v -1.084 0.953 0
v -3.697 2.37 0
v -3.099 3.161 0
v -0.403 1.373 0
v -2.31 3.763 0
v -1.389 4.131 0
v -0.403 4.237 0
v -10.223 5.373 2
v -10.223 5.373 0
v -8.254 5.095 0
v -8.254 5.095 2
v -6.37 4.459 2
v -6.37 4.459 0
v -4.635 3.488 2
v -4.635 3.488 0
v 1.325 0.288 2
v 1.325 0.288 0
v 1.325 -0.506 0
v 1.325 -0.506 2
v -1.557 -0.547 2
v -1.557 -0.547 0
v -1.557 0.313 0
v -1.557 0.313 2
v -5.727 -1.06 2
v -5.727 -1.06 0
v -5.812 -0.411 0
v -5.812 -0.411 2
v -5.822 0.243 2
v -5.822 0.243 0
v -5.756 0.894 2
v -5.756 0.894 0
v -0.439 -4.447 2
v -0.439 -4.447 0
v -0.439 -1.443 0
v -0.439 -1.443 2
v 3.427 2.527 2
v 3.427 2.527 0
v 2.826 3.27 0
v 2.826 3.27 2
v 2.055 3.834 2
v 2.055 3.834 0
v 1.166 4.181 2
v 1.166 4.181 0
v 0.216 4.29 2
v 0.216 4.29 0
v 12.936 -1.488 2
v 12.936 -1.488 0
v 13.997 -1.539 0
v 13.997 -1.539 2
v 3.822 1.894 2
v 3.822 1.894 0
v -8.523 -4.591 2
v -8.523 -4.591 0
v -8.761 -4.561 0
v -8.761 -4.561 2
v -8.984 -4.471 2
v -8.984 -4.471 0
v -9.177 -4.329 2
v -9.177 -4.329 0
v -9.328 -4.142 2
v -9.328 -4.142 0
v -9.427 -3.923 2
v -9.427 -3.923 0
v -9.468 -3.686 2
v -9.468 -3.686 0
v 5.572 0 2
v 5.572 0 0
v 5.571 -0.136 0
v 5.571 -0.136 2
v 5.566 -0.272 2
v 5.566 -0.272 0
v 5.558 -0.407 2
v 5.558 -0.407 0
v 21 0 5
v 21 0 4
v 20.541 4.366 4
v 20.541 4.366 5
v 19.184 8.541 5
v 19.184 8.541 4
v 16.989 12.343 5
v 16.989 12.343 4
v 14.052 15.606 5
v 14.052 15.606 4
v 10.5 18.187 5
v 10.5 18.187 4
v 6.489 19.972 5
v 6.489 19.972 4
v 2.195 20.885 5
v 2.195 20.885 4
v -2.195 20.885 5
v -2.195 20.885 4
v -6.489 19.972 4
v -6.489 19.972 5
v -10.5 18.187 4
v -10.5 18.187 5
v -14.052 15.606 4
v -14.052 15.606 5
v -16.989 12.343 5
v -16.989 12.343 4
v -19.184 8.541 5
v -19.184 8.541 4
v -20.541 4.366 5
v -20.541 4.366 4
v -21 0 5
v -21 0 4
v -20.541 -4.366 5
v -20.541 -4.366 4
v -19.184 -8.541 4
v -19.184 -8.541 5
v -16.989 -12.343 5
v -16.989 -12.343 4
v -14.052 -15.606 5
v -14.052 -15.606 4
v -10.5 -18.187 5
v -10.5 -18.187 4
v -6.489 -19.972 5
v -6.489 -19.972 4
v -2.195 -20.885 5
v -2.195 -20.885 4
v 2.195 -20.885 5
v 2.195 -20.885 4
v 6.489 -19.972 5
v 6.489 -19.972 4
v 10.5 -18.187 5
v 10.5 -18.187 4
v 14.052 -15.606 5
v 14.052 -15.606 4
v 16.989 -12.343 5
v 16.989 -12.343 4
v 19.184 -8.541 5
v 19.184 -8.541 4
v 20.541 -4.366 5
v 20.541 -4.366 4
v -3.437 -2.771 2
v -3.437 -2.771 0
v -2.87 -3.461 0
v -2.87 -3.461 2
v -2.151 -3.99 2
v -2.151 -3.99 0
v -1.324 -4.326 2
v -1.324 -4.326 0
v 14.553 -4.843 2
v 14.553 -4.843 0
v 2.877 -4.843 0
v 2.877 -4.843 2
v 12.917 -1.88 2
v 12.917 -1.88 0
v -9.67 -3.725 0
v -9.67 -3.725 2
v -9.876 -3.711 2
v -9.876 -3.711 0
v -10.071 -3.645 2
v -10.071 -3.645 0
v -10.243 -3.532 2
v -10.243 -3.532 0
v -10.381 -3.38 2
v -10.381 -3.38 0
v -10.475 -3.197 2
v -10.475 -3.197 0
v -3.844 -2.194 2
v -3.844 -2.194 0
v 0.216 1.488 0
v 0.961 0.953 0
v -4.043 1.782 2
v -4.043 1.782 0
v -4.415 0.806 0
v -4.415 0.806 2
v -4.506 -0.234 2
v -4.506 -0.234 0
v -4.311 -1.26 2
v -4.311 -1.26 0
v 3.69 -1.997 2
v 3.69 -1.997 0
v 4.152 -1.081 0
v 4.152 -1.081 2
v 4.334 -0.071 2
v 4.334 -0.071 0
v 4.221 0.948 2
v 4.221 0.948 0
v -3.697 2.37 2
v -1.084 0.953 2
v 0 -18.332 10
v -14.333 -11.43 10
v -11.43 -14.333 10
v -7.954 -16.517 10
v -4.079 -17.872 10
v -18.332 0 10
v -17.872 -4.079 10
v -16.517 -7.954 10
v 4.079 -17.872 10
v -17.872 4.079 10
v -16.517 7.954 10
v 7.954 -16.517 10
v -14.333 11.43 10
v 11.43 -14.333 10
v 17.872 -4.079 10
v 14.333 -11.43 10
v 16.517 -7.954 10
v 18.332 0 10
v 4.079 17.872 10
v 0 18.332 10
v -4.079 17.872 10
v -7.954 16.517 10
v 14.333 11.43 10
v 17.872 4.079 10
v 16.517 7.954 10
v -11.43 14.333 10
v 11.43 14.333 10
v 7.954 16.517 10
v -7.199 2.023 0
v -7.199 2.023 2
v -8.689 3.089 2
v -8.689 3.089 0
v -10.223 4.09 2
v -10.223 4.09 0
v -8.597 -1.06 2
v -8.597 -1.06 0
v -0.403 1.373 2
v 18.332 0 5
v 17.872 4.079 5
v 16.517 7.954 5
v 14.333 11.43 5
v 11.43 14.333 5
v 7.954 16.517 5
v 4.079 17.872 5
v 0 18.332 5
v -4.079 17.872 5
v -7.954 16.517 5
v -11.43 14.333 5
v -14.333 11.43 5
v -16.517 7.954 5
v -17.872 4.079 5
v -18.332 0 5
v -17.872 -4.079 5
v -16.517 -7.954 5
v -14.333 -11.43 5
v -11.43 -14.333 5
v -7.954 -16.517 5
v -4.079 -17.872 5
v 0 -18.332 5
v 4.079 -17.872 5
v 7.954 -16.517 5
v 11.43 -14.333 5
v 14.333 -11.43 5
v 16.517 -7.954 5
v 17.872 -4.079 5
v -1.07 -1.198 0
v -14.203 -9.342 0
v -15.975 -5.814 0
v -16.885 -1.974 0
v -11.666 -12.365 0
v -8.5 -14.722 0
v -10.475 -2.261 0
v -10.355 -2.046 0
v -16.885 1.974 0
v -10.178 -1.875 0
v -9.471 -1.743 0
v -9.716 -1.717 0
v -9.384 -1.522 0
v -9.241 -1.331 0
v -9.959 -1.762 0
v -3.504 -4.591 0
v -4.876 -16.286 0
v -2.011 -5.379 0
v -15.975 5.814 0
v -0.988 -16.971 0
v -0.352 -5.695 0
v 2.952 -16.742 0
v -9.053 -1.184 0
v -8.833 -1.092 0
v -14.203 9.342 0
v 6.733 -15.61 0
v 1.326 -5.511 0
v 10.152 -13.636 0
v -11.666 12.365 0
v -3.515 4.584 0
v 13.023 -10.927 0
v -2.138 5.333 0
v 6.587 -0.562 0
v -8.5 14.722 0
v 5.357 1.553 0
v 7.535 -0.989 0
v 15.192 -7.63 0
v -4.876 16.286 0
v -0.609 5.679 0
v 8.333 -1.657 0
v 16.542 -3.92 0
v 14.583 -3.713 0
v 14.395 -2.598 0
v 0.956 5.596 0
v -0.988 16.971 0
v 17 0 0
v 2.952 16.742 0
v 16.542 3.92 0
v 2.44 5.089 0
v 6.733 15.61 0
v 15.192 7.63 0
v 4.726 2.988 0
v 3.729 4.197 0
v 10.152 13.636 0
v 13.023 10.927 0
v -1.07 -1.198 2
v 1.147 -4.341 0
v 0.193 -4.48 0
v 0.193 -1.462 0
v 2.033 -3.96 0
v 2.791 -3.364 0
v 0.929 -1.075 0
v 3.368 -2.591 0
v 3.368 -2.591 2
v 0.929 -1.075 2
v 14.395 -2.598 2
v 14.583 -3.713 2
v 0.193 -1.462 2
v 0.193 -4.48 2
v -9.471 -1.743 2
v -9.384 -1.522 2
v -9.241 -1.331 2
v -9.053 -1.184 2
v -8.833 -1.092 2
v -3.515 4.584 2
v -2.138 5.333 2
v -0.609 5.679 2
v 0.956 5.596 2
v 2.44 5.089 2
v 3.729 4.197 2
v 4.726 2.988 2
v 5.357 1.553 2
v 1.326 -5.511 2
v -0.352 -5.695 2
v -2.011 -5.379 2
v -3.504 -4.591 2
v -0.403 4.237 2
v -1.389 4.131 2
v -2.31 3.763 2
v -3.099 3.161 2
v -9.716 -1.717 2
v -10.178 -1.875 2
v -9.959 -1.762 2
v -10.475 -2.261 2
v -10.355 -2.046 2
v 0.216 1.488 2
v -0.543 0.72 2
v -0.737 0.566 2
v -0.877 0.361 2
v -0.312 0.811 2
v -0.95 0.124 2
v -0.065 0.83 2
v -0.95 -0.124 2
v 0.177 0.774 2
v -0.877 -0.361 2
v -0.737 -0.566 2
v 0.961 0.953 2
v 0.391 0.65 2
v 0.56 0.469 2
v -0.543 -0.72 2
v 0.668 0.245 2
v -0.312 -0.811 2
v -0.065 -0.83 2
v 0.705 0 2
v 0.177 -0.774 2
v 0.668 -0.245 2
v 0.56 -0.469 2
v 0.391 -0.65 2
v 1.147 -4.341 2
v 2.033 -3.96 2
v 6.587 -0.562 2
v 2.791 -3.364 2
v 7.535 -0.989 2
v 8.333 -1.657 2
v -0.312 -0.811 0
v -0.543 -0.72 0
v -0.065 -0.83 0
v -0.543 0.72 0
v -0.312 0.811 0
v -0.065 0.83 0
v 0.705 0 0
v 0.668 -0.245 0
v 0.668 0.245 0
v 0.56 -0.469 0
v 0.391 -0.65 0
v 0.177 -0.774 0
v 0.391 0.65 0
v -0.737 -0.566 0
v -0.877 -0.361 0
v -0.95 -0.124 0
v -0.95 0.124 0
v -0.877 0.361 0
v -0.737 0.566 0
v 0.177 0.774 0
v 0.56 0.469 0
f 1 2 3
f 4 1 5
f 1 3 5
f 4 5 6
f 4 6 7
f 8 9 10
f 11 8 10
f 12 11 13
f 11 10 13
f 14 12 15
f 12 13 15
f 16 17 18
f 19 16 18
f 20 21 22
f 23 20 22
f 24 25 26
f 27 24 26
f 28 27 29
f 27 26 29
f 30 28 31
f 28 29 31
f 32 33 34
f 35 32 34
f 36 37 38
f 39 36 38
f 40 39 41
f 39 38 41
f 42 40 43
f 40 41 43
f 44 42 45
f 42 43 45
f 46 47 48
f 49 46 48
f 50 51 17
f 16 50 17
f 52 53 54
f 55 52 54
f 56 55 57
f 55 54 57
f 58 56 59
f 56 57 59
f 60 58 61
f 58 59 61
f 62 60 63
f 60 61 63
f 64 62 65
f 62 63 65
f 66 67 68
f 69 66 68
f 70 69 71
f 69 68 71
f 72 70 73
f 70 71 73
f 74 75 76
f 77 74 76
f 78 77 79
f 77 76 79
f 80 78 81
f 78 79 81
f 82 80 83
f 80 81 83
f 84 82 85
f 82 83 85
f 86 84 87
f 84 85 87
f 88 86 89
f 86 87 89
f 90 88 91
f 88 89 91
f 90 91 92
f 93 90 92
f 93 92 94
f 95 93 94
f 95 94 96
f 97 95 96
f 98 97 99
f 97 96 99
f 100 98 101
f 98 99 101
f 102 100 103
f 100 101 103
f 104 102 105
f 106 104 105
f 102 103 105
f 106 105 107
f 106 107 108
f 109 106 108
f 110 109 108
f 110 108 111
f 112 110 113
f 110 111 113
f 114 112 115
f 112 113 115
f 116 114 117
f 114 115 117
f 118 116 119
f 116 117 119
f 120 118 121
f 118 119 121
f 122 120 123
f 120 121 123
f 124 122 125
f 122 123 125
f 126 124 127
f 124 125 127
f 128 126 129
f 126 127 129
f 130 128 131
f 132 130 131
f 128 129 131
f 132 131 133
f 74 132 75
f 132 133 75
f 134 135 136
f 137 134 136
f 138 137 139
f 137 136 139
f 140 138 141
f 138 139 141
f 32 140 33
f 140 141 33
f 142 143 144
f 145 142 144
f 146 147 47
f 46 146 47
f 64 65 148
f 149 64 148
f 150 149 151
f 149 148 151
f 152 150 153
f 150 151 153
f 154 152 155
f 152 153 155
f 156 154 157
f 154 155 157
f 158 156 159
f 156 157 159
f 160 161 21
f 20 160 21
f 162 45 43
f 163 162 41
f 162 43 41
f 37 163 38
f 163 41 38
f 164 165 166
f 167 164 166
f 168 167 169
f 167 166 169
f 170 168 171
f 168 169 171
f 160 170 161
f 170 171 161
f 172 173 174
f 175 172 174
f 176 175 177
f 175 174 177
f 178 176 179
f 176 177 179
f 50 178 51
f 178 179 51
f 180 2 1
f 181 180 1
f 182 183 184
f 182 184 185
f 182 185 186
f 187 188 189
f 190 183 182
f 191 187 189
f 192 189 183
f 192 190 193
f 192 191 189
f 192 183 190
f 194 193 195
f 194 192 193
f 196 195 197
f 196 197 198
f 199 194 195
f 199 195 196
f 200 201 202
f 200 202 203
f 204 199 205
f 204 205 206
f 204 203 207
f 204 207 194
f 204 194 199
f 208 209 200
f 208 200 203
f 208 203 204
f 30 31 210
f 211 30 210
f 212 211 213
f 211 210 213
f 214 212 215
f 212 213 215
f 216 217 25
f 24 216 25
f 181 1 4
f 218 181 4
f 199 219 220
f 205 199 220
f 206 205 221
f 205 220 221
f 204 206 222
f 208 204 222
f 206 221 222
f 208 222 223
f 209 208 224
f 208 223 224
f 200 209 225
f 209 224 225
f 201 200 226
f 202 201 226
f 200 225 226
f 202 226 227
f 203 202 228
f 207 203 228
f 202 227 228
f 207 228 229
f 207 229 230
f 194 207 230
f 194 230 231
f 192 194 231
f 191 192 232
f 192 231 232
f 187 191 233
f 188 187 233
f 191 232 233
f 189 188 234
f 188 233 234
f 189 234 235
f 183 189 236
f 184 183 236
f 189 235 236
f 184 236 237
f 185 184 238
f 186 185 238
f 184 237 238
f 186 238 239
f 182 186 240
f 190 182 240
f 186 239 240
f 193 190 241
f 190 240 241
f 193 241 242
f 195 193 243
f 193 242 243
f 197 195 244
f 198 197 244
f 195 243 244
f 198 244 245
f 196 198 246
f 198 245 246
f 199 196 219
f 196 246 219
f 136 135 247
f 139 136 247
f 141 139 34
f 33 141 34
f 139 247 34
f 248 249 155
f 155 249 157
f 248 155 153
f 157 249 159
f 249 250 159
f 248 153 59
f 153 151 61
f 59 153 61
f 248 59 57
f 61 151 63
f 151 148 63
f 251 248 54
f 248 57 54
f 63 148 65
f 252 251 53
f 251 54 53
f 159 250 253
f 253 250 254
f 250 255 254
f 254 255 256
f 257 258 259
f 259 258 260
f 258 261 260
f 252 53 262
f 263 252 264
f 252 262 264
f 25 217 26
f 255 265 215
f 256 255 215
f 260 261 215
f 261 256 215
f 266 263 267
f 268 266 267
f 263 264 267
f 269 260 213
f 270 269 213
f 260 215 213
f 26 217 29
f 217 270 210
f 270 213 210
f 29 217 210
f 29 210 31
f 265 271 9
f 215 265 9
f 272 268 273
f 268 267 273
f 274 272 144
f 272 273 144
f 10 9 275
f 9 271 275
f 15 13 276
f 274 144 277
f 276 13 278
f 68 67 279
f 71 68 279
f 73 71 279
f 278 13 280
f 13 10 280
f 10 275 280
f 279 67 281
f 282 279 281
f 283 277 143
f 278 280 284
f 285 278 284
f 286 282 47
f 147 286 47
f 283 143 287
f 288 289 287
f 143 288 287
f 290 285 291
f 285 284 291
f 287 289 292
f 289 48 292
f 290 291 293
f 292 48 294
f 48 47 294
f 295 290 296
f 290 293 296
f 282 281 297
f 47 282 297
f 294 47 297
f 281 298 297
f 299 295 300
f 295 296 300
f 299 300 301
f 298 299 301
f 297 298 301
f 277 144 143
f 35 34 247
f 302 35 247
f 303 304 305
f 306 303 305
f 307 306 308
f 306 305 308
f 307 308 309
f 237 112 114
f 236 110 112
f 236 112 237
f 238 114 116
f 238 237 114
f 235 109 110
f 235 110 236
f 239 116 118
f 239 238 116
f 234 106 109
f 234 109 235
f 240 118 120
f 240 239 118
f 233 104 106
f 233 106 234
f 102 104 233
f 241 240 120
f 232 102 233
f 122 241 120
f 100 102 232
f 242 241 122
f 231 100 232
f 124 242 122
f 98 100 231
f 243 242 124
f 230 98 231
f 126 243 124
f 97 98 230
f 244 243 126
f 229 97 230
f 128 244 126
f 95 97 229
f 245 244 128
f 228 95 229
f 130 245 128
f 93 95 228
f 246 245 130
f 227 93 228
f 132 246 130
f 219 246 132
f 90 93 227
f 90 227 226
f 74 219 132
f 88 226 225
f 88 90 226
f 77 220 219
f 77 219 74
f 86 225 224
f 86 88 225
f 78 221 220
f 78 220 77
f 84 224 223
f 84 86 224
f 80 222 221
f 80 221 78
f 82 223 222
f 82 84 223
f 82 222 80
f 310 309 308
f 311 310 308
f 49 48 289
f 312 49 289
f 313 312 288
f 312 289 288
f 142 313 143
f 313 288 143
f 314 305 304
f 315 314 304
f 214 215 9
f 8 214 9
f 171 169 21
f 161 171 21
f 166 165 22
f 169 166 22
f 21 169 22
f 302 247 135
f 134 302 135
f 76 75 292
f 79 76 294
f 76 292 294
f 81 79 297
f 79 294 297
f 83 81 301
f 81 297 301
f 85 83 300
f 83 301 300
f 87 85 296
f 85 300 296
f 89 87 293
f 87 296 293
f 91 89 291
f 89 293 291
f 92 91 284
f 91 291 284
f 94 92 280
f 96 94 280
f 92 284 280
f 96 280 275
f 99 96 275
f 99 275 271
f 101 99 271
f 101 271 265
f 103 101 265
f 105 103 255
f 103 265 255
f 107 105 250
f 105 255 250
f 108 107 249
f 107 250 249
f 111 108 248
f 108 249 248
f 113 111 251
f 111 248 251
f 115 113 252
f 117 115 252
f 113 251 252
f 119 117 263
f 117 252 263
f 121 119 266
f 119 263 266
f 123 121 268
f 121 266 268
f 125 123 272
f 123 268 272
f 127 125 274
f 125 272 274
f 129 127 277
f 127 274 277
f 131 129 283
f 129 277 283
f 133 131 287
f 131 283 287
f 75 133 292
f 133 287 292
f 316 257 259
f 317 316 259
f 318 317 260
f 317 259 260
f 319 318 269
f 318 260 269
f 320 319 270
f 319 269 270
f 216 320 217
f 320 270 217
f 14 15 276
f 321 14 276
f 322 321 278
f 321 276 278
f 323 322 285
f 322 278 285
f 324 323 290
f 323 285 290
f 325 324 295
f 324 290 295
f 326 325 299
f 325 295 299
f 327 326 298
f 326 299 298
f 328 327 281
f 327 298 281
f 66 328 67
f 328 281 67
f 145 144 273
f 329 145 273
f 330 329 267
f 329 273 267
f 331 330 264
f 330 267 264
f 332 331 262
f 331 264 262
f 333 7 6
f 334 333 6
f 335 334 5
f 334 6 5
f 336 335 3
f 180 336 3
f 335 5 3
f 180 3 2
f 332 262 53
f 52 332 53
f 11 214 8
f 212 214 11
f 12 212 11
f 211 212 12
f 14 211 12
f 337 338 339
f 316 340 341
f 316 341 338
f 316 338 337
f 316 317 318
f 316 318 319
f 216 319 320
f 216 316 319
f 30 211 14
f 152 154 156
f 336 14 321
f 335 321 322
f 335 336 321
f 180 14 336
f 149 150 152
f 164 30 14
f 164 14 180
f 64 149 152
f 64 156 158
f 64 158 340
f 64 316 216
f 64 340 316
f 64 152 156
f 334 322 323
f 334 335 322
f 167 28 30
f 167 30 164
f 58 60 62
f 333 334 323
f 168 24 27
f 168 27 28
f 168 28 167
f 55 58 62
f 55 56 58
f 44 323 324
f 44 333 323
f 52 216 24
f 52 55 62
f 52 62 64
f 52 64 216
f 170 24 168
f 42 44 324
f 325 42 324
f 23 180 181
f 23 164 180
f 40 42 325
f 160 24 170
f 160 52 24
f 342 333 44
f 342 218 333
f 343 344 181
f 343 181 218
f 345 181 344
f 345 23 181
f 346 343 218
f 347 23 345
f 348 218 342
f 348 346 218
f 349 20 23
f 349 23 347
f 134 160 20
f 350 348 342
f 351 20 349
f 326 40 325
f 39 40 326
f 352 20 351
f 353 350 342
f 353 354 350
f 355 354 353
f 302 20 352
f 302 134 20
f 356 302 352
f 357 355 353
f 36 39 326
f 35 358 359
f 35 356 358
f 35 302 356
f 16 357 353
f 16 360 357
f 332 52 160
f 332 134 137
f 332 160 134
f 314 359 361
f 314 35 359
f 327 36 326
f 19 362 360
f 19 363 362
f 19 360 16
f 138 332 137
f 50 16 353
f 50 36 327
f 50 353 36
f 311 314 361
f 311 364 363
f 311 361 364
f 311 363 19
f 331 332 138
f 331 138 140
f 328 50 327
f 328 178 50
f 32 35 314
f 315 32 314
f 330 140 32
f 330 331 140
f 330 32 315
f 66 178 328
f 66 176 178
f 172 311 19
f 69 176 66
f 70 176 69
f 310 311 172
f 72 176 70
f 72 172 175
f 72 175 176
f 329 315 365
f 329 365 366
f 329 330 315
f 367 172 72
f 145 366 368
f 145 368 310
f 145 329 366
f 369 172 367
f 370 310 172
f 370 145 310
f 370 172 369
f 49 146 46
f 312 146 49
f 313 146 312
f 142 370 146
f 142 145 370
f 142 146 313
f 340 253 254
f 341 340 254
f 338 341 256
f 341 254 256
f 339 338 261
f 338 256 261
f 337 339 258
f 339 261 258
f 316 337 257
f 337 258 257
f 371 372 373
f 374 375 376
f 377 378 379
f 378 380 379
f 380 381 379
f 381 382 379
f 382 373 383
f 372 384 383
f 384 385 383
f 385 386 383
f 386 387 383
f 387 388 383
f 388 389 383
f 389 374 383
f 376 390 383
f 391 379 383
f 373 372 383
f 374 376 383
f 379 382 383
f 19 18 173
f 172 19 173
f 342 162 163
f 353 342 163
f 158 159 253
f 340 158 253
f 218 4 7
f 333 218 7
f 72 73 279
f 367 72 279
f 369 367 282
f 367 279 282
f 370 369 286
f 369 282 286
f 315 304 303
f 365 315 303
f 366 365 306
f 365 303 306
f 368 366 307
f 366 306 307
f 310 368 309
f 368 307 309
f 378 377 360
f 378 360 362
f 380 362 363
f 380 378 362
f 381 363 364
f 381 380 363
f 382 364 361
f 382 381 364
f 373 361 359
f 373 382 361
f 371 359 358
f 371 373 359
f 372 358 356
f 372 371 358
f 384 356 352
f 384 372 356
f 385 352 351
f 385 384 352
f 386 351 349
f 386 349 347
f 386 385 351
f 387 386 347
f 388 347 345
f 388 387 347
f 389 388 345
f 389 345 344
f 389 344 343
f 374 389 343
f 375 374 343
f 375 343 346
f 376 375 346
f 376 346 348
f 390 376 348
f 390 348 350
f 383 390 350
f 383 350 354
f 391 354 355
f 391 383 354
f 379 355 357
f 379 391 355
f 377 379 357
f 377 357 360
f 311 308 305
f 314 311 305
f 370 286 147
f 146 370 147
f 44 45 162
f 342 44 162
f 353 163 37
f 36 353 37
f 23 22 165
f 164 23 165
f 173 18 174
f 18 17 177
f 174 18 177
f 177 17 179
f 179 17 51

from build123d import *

# Parameters (mm, degrees)
F0_R     = 21
F1_DEPTH = 5
F2_R     = 18.332
F3_DEPTH = 5
F4_R     = 0.831881
F5_DEPTH = 2
F6_SIZE  = 4


with BuildPart() as f1:
    # F0 (on Top) → F1 (new body)
    with BuildSketch(Plane.XY):
        Circle(F0_R)
    extrude(amount=F1_DEPTH)

    # F2 (on face) → F3 (join)
    with BuildSketch(Plane.XY.offset(5)):
        Circle(F2_R)
    extrude(amount=F3_DEPTH)

    # F4 (on face) → F5 (cut)
    with BuildSketch(Plane(origin=(0, 0, 0), x_dir=(1, 0, 0), z_dir=(0, 0, -1))):
        with BuildLine():
            Line((-8.597011, 1.060302), (-5.727476, 1.060302))
            ThreePointArc((-5.727476, 1.060302), (-4.950709, 3.036583), (-3.504453, 4.59138))
            Line((-3.504453, 4.59138), (-8.52302, 4.59138))
            ThreePointArc((-8.52302, 4.59138), (-9.17742, 4.328519), (-9.468151, 3.686015))
            ThreePointArc((-9.468151, 3.686015), (-10.070724, 3.645277), (-10.475405, 3.196962))
            Line((-10.475405, 3.196962), (-10.475405, 2.261244))
            ThreePointArc((-10.475405, 2.261244), (-10.072278, 1.81049), (-9.47128, 1.743463))
            ThreePointArc((-9.47128, 1.743463), (-9.151775, 1.251347), (-8.597011, 1.060302))
        make_face()
        with BuildLine():
            ThreePointArc((-3.504453, 4.59138), (-4.950709, 3.036583), (-5.727476, 1.060302))
            ThreePointArc((-5.727476, 1.060302), (-5.826342, 0.084509), (-5.756453, -0.893787))
            ThreePointArc((-5.756453, -0.893787), (-5.359136, -2.261429), (-4.635161, -3.487874))
            ThreePointArc((-4.635161, -3.487874), (1.715573, -5.393429), (5.572241, 0))
            ThreePointArc((5.572241, 0), (5.5686, 0.2037), (5.557681, 0.407141))
            ThreePointArc((5.557681, 0.407141), (4.75085, 2.947629), (2.877083, 4.843428))
            ThreePointArc((2.877083, 4.843428), (-0.352303, 5.695164), (-3.504453, 4.59138))
        make_face()
        with BuildLine():
            Line((-0.40257, -1.372951), (-0.40257, -4.237055))
            ThreePointArc((-0.40257, -4.237055), (-2.31047, -3.76336), (-3.696814, -2.369617))
            Line((-3.696814, -2.369617), (-1.0845, -0.953302))
            Line((-1.0845, -0.953302), (-0.40257, -1.372951))
        make_face(mode=Mode.SUBTRACT)
        with BuildLine():
            Line((0.216412, -4.289511), (0.216412, -1.488355))
            Line((0.216412, -1.488355), (0.961289, -0.953302))
            Line((0.961289, -0.953302), (3.426726, -2.526986))
            ThreePointArc((3.426726, -2.526986), (2.055218, -3.833824), (0.216412, -4.289511))
        make_face(mode=Mode.SUBTRACT)
        with BuildLine():
            Line((-1.556605, 0.546942), (-1.556605, -0.313338))
            Line((-1.556605, -0.313338), (-4.043024, -1.782109))
            ThreePointArc((-4.043024, -1.782109), (-4.506304, 0.234199), (-3.843691, 2.194064))
            Line((-3.843691, 2.194064), (-1.556605, 0.546942))
        make_face(mode=Mode.SUBTRACT)
        with Locations((-0.127364, 0)):
            Circle(F4_R, mode=Mode.SUBTRACT)
        with BuildLine():
            Line((-0.439486, 1.44269), (-1.070051, 1.197883))
            Line((-1.070051, 1.197883), (-3.436526, 2.770586))
            ThreePointArc((-3.436526, 2.770586), (-2.151244, 3.990055), (-0.439486, 4.447148))
            Line((-0.439486, 4.447148), (-0.439486, 1.44269))
        make_face(mode=Mode.SUBTRACT)
        with BuildLine():
            Line((3.821978, -1.8935), (1.325343, -0.287891))
            Line((1.325343, -0.287891), (1.325343, 0.506092))
            Line((1.325343, 0.506092), (3.689648, 1.997015))
            ThreePointArc((3.689648, 1.997015), (4.334116, 0.071428), (3.821978, -1.8935))
        make_face(mode=Mode.SUBTRACT)
        with BuildLine():
            Line((3.368104, 2.591078), (0.929, 1.075215))
            Line((0.929, 1.075215), (0.192902, 1.461979))
            Line((0.192902, 1.461979), (0.192902, 4.479774))
            ThreePointArc((0.192902, 4.479774), (2.033345, 3.960494), (3.368104, 2.591078))
        make_face(mode=Mode.SUBTRACT)
        with BuildLine():
            ThreePointArc((-4.635161, -3.487874), (-5.359136, -2.261429), (-5.756453, -0.893787))
            ThreePointArc((-5.756453, -0.893787), (-7.938026, -2.56399), (-10.222816, -4.089958))
            Line((-10.222816, -4.089958), (-10.222816, -5.373343))
            ThreePointArc((-10.222816, -5.373343), (-7.297319, -4.820816), (-4.635161, -3.487874))
        make_face()
        with BuildLine():
            Line((14.553333, 4.843428), (2.877083, 4.843428))
            ThreePointArc((2.877083, 4.843428), (4.75085, 2.947629), (5.557681, 0.407141))
            ThreePointArc((5.557681, 0.407141), (7.075636, 0.742717), (8.332674, 1.657405))
            Line((8.332674, 1.657405), (12.917255, 1.879957))
            Line((12.917255, 1.879957), (12.9363, 1.48763))
            Line((12.9363, 1.48763), (13.997183, 1.539129))
            ThreePointArc((13.997183, 1.539129), (14.516183, 3.150728), (14.553333, 4.843428))
        make_face()
    extrude(amount=-F5_DEPTH, mode=Mode.SUBTRACT)

    # F6
    f6_edges = [f1.edges().sort_by_distance(p)[0] for p in [
        (-21, 0, 0),
    ]]
    chamfer(f6_edges, length=F6_SIZE)


solid = f1.part
